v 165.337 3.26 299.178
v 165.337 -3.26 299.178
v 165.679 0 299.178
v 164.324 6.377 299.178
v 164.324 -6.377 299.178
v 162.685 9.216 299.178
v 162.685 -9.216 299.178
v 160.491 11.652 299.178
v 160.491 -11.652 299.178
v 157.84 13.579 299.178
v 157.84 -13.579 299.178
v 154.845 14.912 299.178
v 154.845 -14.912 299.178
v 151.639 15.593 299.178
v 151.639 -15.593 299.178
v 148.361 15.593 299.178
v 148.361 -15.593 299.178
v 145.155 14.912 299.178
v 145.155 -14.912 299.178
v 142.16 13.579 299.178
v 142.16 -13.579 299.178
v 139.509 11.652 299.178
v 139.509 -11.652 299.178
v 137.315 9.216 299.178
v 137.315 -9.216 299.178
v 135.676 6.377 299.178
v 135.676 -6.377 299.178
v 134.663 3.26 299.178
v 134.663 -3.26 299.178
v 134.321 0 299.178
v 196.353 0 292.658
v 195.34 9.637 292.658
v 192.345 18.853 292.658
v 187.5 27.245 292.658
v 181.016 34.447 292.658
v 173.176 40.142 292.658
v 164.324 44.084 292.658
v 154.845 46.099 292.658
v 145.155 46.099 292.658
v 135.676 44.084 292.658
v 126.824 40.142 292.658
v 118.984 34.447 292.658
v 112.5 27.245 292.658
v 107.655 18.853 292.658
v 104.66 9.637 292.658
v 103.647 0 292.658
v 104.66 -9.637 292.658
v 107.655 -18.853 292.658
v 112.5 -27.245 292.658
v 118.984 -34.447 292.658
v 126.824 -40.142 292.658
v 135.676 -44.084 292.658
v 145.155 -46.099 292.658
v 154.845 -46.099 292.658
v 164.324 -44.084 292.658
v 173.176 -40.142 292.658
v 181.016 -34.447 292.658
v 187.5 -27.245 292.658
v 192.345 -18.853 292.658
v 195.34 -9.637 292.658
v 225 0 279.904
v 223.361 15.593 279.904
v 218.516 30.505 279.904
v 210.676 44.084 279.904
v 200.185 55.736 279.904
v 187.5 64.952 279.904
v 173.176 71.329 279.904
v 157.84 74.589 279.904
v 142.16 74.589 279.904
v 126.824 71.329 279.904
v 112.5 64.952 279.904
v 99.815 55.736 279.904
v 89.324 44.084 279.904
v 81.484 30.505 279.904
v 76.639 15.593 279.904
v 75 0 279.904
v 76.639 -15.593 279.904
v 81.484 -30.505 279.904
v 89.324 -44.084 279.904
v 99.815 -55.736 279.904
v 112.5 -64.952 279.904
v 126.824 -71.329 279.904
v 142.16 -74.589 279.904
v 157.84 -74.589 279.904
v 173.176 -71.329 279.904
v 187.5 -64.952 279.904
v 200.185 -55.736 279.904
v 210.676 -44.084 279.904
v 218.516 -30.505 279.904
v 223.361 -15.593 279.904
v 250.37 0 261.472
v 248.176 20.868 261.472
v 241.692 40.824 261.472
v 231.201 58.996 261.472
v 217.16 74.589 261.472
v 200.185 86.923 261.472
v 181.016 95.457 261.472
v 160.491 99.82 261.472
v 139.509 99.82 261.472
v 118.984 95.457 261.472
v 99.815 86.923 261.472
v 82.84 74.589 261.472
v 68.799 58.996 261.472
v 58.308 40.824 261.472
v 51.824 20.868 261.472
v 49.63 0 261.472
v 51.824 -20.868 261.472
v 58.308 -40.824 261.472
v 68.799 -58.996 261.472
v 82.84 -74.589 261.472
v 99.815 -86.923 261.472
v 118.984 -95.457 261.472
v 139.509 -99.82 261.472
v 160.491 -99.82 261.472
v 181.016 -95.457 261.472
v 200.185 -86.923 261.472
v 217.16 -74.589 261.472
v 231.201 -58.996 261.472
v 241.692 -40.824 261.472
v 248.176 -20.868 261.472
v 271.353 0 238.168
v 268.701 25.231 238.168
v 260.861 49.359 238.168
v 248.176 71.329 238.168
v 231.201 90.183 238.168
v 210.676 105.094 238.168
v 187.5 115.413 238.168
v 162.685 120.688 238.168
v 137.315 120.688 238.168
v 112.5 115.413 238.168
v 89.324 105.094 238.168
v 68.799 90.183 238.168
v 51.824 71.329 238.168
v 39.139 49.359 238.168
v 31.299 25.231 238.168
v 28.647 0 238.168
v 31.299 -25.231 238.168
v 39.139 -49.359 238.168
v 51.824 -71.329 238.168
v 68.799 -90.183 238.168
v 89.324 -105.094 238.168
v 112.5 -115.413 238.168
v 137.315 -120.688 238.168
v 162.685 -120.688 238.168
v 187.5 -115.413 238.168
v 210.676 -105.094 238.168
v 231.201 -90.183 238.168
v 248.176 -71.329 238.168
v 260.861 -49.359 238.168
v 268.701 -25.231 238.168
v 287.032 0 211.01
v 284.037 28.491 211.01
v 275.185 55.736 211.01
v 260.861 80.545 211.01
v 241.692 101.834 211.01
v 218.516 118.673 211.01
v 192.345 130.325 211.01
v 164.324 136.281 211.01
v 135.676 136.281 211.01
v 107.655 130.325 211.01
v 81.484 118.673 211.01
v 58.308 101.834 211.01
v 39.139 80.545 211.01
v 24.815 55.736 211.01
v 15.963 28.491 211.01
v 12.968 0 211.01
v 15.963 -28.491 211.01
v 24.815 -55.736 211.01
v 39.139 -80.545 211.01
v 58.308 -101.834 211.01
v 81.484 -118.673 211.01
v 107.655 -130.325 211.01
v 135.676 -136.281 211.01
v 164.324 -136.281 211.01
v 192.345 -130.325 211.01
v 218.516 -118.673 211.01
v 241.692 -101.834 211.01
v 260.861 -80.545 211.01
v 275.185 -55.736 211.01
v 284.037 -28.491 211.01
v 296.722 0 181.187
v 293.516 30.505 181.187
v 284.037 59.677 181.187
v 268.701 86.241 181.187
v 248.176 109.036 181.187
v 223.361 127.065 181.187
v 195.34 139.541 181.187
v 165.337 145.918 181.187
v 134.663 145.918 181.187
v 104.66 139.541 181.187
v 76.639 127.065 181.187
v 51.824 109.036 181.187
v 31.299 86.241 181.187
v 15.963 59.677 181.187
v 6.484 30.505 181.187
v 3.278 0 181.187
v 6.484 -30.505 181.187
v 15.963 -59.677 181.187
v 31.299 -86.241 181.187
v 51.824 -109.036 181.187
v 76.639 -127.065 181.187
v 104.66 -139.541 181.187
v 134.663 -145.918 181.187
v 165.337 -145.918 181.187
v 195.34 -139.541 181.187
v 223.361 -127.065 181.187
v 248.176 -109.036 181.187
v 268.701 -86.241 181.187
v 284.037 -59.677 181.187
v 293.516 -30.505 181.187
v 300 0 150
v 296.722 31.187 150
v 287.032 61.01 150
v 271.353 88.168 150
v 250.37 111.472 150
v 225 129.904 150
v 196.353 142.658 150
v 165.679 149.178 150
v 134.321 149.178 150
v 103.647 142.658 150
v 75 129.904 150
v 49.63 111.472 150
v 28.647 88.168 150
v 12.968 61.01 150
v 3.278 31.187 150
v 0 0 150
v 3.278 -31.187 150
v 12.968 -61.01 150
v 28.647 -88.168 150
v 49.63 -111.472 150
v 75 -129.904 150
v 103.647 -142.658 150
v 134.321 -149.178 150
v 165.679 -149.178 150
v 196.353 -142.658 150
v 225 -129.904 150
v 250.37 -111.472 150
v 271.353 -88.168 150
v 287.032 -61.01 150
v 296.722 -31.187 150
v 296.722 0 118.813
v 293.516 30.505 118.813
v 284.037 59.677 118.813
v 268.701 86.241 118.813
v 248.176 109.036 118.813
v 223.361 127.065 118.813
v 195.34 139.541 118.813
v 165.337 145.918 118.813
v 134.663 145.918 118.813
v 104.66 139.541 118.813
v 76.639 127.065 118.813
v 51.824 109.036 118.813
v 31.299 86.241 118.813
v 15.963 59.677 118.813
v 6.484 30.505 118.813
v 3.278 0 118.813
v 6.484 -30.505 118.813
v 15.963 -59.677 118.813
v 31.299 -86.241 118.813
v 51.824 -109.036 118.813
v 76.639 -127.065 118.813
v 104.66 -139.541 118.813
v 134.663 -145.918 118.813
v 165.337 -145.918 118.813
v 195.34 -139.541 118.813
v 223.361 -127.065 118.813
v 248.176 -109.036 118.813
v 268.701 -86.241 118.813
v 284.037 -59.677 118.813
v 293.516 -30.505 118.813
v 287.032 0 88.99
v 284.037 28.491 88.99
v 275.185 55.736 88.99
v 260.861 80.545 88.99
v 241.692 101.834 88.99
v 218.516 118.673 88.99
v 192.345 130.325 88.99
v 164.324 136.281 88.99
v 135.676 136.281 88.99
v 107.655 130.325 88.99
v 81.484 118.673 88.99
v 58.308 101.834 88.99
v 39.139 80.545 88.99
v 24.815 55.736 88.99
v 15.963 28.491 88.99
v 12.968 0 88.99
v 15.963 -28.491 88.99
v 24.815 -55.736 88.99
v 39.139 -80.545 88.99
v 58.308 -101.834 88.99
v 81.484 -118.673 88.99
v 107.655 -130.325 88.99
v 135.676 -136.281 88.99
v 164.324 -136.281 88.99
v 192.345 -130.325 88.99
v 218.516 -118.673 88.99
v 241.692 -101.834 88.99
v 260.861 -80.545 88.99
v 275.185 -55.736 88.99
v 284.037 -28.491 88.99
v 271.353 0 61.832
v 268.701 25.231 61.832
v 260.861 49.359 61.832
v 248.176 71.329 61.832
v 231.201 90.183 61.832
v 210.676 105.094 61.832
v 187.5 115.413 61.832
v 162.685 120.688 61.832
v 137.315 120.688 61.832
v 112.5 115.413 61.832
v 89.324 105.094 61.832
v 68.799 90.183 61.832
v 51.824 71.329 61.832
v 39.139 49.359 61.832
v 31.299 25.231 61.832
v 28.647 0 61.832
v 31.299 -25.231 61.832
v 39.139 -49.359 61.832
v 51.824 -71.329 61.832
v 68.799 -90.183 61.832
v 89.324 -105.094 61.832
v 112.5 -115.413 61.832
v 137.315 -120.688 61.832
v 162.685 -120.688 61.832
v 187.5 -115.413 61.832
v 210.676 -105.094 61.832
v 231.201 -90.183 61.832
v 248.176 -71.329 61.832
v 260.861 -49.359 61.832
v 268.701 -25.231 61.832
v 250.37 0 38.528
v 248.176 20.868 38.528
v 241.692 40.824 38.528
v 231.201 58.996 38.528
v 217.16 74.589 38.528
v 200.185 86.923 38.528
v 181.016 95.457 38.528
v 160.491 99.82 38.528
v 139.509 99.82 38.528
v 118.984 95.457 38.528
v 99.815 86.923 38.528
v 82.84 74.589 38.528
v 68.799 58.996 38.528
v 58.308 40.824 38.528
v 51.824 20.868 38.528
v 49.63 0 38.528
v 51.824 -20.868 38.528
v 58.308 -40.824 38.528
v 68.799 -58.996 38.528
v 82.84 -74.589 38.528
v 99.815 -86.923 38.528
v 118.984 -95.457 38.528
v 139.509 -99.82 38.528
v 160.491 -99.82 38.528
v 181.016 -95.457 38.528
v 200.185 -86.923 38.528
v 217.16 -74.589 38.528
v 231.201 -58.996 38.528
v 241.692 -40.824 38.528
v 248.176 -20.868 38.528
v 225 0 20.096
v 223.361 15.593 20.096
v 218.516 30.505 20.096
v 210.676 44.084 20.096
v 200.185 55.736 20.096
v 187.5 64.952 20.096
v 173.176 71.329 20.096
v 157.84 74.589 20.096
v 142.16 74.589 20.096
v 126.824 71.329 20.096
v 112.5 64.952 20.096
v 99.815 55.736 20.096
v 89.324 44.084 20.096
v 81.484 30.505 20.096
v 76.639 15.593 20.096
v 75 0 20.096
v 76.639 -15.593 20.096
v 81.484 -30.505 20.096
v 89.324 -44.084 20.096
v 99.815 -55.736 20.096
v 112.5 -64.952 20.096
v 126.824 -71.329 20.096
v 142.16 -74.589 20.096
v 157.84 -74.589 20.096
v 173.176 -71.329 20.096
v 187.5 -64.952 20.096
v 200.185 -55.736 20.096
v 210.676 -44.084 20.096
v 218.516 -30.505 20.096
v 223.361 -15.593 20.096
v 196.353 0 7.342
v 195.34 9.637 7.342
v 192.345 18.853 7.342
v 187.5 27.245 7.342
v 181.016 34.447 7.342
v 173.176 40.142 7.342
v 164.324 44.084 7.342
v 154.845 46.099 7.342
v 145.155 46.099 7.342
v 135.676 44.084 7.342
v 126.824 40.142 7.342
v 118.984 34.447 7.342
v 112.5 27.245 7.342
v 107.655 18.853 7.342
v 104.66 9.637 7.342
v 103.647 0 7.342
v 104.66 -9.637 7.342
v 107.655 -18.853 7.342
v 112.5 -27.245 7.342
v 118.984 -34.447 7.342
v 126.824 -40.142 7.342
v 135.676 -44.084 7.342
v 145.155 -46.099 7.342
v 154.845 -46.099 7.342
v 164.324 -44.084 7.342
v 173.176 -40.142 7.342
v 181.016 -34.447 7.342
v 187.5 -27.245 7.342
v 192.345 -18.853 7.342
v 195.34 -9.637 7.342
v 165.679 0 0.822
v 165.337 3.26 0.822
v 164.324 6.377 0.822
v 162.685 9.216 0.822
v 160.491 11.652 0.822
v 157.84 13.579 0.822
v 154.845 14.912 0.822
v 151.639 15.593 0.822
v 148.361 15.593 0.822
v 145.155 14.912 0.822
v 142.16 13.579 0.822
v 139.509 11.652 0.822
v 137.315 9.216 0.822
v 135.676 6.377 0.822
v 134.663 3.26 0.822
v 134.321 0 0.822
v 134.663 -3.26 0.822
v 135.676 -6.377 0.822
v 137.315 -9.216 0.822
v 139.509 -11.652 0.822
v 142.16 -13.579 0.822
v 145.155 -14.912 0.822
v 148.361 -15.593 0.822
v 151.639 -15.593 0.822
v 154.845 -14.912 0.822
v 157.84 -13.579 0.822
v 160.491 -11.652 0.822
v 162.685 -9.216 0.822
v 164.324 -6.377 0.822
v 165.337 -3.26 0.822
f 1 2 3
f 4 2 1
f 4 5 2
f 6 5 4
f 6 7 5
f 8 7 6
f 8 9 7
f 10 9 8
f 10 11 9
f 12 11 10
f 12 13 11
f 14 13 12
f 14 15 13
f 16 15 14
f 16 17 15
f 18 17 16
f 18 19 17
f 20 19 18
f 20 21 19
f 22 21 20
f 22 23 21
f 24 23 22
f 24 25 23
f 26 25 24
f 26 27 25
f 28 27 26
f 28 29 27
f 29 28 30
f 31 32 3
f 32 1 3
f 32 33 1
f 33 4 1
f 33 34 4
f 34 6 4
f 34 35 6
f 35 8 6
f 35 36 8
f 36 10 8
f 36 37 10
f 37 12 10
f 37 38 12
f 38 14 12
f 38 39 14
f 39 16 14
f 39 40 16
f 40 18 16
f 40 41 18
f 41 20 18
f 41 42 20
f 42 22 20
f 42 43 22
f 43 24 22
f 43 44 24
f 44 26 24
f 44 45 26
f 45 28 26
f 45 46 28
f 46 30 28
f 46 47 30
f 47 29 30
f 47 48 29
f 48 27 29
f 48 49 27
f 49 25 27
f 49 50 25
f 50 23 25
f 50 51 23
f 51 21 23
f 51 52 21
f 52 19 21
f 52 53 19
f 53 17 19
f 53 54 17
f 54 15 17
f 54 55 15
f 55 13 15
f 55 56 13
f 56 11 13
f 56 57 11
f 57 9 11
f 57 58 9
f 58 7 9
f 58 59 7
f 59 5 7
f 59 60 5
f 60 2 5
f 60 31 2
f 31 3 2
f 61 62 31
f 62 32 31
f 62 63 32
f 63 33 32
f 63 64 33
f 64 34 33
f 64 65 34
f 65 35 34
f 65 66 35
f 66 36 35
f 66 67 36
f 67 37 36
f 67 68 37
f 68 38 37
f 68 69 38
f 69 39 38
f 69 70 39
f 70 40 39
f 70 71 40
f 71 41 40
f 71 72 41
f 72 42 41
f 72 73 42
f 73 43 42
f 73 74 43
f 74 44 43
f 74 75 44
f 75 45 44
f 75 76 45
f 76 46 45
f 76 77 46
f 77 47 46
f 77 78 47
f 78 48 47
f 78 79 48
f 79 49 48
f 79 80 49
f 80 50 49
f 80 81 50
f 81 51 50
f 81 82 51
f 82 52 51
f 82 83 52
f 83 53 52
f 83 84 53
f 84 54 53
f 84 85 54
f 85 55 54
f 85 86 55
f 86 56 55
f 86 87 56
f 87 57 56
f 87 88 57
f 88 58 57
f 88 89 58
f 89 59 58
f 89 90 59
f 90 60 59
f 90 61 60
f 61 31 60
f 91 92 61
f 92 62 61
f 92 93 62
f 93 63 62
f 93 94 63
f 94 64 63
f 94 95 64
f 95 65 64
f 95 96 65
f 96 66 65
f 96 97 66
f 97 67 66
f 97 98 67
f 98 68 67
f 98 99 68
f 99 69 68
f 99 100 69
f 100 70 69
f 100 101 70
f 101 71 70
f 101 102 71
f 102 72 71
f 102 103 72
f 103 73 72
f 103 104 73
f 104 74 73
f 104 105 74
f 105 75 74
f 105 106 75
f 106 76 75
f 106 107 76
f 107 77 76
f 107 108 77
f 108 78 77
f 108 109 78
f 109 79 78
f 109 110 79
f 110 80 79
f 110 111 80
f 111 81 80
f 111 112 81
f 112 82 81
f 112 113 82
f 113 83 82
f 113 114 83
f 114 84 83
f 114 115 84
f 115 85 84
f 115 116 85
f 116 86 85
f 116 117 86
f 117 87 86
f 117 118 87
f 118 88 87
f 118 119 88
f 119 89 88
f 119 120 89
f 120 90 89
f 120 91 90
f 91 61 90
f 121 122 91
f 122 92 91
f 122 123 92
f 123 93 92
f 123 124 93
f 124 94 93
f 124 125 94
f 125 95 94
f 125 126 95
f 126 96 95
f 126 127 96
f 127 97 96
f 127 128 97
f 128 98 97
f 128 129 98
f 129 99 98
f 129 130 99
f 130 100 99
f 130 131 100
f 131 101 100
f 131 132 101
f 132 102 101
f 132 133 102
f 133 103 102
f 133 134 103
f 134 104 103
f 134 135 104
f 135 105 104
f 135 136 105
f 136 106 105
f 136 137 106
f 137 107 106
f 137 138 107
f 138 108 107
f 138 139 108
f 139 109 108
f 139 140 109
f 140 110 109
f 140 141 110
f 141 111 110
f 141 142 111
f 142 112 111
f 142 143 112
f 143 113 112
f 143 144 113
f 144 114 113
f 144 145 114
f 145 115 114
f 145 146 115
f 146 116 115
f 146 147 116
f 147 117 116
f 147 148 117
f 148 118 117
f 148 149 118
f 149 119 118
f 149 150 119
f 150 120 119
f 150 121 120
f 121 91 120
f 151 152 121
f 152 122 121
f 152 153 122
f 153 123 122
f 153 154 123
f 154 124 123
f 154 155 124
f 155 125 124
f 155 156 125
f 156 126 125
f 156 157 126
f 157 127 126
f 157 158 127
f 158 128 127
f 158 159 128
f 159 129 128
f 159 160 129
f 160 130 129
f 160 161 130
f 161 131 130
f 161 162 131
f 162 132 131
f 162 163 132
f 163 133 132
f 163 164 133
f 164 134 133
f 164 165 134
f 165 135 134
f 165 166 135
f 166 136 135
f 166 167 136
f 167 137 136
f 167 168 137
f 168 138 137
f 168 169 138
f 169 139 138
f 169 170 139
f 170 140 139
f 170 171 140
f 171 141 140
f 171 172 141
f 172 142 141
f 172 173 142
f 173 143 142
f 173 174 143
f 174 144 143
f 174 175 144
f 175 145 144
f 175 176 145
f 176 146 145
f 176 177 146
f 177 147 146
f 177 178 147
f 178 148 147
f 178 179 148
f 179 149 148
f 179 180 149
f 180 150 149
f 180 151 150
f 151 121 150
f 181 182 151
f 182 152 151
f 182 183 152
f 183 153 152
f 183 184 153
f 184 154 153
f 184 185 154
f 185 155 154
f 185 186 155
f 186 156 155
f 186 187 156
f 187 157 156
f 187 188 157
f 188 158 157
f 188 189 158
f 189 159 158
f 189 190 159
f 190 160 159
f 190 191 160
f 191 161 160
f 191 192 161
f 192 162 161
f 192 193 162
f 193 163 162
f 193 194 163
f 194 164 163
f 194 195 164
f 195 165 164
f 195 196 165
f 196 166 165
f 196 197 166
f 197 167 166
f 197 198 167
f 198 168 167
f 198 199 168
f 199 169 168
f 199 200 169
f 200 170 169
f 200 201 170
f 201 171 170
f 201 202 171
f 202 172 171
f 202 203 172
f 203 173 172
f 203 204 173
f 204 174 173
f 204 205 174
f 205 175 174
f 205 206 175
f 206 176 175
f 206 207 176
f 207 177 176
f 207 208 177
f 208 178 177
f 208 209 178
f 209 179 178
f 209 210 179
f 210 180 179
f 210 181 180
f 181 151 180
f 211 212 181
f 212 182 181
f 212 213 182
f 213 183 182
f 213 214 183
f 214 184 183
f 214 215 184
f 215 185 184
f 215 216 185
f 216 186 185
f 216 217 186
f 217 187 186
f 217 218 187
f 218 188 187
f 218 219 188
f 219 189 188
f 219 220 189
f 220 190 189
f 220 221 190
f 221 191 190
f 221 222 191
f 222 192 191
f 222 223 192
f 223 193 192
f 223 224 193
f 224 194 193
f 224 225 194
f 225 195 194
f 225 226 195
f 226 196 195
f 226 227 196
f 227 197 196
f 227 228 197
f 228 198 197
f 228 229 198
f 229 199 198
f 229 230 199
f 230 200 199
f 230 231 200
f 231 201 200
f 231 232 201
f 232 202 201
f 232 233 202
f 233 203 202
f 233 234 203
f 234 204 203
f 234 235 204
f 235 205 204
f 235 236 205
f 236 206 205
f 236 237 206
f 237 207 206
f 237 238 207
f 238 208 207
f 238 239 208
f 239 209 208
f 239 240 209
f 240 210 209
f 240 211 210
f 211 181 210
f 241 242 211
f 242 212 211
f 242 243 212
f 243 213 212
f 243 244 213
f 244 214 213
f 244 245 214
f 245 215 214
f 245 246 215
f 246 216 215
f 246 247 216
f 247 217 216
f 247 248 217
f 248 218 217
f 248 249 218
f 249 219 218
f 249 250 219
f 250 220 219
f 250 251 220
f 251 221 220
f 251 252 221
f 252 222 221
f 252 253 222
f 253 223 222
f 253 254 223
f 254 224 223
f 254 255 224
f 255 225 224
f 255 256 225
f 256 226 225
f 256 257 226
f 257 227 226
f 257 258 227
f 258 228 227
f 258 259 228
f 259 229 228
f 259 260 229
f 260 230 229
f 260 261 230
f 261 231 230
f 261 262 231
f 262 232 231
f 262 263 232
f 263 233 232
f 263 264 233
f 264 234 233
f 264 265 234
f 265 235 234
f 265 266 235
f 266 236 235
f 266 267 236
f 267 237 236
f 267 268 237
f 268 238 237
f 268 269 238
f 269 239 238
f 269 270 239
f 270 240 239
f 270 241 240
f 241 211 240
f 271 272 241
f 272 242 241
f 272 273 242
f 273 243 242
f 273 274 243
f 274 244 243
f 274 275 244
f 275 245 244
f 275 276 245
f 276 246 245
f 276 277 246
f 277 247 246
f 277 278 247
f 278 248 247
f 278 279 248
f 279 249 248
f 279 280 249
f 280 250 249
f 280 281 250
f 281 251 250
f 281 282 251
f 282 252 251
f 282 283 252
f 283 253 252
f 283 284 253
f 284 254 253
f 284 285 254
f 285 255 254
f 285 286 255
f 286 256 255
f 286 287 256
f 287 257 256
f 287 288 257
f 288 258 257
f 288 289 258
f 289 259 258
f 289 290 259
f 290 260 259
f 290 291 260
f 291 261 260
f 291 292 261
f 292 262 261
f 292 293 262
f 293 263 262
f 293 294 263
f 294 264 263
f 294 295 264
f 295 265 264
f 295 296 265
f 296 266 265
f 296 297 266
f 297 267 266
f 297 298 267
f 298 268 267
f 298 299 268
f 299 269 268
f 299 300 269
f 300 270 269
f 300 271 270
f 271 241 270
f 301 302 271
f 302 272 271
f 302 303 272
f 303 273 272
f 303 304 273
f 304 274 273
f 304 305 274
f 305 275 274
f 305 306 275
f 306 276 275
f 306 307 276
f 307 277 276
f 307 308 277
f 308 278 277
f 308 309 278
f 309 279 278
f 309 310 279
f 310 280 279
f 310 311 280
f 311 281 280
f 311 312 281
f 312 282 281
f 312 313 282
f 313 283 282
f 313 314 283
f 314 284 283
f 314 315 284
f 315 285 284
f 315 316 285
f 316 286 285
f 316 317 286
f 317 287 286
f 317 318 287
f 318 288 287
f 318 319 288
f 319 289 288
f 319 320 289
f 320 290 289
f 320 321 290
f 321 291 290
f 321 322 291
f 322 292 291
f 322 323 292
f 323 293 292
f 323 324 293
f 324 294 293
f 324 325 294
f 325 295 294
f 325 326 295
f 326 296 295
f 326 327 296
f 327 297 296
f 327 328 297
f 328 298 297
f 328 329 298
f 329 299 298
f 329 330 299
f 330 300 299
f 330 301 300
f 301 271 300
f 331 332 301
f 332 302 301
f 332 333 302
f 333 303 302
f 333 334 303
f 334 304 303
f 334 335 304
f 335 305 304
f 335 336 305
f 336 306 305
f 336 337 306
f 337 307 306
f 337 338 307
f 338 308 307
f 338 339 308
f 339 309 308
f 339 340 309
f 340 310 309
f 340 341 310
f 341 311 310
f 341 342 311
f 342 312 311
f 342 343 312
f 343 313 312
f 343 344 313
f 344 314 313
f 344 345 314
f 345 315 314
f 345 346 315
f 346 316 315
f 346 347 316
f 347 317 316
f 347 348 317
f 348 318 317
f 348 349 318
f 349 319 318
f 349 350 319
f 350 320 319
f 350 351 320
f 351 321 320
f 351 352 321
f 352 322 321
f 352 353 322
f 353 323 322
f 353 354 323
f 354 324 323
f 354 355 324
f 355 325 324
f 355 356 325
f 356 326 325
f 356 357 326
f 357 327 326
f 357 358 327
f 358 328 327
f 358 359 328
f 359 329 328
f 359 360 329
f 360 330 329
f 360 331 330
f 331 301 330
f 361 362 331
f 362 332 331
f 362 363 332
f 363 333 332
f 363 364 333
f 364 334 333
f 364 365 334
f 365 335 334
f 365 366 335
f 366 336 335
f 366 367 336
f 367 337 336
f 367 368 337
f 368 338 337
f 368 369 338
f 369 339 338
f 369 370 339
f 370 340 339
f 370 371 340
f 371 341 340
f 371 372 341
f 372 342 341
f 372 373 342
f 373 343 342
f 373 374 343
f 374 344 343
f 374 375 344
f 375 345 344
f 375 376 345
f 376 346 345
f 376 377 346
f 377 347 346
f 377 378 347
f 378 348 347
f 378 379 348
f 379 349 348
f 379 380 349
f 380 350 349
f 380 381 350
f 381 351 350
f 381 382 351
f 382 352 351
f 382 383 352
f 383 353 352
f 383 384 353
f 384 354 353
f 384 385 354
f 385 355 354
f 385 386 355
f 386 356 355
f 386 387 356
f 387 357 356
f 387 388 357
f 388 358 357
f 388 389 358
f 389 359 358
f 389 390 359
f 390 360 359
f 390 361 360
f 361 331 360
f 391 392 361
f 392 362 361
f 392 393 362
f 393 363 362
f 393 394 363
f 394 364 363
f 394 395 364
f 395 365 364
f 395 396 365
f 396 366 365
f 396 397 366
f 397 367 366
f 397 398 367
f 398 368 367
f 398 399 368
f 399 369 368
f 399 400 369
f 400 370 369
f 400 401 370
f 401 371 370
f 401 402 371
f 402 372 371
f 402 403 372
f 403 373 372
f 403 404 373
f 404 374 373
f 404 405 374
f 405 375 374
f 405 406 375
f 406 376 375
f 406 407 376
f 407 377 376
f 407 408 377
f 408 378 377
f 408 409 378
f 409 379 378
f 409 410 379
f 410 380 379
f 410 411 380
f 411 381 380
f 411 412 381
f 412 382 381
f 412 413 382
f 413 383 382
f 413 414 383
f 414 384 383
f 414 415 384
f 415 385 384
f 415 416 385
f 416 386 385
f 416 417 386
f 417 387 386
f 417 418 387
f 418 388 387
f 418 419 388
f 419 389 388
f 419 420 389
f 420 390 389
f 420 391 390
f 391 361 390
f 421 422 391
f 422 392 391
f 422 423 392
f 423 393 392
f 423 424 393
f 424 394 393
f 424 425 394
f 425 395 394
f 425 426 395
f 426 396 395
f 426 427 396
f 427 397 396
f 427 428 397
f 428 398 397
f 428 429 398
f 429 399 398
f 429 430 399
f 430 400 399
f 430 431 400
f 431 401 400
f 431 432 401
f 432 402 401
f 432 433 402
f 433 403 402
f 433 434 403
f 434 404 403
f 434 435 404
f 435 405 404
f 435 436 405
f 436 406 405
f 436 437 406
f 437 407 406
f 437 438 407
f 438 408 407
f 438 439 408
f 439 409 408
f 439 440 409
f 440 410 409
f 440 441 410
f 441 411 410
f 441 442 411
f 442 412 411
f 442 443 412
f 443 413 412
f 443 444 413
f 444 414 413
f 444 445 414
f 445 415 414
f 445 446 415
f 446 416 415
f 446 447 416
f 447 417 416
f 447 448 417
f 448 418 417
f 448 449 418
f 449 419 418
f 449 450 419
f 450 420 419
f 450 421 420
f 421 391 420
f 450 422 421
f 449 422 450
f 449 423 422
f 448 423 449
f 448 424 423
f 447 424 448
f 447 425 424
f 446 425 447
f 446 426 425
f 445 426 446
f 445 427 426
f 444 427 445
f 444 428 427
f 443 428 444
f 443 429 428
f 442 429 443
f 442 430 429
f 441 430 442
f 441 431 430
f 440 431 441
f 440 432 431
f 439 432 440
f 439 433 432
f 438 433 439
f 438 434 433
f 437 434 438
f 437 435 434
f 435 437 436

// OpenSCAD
// A 300 mm sphere resting on z = 0, its nose at x = 0.
translate([150, 0, 150])
    sphere(d = 300);
